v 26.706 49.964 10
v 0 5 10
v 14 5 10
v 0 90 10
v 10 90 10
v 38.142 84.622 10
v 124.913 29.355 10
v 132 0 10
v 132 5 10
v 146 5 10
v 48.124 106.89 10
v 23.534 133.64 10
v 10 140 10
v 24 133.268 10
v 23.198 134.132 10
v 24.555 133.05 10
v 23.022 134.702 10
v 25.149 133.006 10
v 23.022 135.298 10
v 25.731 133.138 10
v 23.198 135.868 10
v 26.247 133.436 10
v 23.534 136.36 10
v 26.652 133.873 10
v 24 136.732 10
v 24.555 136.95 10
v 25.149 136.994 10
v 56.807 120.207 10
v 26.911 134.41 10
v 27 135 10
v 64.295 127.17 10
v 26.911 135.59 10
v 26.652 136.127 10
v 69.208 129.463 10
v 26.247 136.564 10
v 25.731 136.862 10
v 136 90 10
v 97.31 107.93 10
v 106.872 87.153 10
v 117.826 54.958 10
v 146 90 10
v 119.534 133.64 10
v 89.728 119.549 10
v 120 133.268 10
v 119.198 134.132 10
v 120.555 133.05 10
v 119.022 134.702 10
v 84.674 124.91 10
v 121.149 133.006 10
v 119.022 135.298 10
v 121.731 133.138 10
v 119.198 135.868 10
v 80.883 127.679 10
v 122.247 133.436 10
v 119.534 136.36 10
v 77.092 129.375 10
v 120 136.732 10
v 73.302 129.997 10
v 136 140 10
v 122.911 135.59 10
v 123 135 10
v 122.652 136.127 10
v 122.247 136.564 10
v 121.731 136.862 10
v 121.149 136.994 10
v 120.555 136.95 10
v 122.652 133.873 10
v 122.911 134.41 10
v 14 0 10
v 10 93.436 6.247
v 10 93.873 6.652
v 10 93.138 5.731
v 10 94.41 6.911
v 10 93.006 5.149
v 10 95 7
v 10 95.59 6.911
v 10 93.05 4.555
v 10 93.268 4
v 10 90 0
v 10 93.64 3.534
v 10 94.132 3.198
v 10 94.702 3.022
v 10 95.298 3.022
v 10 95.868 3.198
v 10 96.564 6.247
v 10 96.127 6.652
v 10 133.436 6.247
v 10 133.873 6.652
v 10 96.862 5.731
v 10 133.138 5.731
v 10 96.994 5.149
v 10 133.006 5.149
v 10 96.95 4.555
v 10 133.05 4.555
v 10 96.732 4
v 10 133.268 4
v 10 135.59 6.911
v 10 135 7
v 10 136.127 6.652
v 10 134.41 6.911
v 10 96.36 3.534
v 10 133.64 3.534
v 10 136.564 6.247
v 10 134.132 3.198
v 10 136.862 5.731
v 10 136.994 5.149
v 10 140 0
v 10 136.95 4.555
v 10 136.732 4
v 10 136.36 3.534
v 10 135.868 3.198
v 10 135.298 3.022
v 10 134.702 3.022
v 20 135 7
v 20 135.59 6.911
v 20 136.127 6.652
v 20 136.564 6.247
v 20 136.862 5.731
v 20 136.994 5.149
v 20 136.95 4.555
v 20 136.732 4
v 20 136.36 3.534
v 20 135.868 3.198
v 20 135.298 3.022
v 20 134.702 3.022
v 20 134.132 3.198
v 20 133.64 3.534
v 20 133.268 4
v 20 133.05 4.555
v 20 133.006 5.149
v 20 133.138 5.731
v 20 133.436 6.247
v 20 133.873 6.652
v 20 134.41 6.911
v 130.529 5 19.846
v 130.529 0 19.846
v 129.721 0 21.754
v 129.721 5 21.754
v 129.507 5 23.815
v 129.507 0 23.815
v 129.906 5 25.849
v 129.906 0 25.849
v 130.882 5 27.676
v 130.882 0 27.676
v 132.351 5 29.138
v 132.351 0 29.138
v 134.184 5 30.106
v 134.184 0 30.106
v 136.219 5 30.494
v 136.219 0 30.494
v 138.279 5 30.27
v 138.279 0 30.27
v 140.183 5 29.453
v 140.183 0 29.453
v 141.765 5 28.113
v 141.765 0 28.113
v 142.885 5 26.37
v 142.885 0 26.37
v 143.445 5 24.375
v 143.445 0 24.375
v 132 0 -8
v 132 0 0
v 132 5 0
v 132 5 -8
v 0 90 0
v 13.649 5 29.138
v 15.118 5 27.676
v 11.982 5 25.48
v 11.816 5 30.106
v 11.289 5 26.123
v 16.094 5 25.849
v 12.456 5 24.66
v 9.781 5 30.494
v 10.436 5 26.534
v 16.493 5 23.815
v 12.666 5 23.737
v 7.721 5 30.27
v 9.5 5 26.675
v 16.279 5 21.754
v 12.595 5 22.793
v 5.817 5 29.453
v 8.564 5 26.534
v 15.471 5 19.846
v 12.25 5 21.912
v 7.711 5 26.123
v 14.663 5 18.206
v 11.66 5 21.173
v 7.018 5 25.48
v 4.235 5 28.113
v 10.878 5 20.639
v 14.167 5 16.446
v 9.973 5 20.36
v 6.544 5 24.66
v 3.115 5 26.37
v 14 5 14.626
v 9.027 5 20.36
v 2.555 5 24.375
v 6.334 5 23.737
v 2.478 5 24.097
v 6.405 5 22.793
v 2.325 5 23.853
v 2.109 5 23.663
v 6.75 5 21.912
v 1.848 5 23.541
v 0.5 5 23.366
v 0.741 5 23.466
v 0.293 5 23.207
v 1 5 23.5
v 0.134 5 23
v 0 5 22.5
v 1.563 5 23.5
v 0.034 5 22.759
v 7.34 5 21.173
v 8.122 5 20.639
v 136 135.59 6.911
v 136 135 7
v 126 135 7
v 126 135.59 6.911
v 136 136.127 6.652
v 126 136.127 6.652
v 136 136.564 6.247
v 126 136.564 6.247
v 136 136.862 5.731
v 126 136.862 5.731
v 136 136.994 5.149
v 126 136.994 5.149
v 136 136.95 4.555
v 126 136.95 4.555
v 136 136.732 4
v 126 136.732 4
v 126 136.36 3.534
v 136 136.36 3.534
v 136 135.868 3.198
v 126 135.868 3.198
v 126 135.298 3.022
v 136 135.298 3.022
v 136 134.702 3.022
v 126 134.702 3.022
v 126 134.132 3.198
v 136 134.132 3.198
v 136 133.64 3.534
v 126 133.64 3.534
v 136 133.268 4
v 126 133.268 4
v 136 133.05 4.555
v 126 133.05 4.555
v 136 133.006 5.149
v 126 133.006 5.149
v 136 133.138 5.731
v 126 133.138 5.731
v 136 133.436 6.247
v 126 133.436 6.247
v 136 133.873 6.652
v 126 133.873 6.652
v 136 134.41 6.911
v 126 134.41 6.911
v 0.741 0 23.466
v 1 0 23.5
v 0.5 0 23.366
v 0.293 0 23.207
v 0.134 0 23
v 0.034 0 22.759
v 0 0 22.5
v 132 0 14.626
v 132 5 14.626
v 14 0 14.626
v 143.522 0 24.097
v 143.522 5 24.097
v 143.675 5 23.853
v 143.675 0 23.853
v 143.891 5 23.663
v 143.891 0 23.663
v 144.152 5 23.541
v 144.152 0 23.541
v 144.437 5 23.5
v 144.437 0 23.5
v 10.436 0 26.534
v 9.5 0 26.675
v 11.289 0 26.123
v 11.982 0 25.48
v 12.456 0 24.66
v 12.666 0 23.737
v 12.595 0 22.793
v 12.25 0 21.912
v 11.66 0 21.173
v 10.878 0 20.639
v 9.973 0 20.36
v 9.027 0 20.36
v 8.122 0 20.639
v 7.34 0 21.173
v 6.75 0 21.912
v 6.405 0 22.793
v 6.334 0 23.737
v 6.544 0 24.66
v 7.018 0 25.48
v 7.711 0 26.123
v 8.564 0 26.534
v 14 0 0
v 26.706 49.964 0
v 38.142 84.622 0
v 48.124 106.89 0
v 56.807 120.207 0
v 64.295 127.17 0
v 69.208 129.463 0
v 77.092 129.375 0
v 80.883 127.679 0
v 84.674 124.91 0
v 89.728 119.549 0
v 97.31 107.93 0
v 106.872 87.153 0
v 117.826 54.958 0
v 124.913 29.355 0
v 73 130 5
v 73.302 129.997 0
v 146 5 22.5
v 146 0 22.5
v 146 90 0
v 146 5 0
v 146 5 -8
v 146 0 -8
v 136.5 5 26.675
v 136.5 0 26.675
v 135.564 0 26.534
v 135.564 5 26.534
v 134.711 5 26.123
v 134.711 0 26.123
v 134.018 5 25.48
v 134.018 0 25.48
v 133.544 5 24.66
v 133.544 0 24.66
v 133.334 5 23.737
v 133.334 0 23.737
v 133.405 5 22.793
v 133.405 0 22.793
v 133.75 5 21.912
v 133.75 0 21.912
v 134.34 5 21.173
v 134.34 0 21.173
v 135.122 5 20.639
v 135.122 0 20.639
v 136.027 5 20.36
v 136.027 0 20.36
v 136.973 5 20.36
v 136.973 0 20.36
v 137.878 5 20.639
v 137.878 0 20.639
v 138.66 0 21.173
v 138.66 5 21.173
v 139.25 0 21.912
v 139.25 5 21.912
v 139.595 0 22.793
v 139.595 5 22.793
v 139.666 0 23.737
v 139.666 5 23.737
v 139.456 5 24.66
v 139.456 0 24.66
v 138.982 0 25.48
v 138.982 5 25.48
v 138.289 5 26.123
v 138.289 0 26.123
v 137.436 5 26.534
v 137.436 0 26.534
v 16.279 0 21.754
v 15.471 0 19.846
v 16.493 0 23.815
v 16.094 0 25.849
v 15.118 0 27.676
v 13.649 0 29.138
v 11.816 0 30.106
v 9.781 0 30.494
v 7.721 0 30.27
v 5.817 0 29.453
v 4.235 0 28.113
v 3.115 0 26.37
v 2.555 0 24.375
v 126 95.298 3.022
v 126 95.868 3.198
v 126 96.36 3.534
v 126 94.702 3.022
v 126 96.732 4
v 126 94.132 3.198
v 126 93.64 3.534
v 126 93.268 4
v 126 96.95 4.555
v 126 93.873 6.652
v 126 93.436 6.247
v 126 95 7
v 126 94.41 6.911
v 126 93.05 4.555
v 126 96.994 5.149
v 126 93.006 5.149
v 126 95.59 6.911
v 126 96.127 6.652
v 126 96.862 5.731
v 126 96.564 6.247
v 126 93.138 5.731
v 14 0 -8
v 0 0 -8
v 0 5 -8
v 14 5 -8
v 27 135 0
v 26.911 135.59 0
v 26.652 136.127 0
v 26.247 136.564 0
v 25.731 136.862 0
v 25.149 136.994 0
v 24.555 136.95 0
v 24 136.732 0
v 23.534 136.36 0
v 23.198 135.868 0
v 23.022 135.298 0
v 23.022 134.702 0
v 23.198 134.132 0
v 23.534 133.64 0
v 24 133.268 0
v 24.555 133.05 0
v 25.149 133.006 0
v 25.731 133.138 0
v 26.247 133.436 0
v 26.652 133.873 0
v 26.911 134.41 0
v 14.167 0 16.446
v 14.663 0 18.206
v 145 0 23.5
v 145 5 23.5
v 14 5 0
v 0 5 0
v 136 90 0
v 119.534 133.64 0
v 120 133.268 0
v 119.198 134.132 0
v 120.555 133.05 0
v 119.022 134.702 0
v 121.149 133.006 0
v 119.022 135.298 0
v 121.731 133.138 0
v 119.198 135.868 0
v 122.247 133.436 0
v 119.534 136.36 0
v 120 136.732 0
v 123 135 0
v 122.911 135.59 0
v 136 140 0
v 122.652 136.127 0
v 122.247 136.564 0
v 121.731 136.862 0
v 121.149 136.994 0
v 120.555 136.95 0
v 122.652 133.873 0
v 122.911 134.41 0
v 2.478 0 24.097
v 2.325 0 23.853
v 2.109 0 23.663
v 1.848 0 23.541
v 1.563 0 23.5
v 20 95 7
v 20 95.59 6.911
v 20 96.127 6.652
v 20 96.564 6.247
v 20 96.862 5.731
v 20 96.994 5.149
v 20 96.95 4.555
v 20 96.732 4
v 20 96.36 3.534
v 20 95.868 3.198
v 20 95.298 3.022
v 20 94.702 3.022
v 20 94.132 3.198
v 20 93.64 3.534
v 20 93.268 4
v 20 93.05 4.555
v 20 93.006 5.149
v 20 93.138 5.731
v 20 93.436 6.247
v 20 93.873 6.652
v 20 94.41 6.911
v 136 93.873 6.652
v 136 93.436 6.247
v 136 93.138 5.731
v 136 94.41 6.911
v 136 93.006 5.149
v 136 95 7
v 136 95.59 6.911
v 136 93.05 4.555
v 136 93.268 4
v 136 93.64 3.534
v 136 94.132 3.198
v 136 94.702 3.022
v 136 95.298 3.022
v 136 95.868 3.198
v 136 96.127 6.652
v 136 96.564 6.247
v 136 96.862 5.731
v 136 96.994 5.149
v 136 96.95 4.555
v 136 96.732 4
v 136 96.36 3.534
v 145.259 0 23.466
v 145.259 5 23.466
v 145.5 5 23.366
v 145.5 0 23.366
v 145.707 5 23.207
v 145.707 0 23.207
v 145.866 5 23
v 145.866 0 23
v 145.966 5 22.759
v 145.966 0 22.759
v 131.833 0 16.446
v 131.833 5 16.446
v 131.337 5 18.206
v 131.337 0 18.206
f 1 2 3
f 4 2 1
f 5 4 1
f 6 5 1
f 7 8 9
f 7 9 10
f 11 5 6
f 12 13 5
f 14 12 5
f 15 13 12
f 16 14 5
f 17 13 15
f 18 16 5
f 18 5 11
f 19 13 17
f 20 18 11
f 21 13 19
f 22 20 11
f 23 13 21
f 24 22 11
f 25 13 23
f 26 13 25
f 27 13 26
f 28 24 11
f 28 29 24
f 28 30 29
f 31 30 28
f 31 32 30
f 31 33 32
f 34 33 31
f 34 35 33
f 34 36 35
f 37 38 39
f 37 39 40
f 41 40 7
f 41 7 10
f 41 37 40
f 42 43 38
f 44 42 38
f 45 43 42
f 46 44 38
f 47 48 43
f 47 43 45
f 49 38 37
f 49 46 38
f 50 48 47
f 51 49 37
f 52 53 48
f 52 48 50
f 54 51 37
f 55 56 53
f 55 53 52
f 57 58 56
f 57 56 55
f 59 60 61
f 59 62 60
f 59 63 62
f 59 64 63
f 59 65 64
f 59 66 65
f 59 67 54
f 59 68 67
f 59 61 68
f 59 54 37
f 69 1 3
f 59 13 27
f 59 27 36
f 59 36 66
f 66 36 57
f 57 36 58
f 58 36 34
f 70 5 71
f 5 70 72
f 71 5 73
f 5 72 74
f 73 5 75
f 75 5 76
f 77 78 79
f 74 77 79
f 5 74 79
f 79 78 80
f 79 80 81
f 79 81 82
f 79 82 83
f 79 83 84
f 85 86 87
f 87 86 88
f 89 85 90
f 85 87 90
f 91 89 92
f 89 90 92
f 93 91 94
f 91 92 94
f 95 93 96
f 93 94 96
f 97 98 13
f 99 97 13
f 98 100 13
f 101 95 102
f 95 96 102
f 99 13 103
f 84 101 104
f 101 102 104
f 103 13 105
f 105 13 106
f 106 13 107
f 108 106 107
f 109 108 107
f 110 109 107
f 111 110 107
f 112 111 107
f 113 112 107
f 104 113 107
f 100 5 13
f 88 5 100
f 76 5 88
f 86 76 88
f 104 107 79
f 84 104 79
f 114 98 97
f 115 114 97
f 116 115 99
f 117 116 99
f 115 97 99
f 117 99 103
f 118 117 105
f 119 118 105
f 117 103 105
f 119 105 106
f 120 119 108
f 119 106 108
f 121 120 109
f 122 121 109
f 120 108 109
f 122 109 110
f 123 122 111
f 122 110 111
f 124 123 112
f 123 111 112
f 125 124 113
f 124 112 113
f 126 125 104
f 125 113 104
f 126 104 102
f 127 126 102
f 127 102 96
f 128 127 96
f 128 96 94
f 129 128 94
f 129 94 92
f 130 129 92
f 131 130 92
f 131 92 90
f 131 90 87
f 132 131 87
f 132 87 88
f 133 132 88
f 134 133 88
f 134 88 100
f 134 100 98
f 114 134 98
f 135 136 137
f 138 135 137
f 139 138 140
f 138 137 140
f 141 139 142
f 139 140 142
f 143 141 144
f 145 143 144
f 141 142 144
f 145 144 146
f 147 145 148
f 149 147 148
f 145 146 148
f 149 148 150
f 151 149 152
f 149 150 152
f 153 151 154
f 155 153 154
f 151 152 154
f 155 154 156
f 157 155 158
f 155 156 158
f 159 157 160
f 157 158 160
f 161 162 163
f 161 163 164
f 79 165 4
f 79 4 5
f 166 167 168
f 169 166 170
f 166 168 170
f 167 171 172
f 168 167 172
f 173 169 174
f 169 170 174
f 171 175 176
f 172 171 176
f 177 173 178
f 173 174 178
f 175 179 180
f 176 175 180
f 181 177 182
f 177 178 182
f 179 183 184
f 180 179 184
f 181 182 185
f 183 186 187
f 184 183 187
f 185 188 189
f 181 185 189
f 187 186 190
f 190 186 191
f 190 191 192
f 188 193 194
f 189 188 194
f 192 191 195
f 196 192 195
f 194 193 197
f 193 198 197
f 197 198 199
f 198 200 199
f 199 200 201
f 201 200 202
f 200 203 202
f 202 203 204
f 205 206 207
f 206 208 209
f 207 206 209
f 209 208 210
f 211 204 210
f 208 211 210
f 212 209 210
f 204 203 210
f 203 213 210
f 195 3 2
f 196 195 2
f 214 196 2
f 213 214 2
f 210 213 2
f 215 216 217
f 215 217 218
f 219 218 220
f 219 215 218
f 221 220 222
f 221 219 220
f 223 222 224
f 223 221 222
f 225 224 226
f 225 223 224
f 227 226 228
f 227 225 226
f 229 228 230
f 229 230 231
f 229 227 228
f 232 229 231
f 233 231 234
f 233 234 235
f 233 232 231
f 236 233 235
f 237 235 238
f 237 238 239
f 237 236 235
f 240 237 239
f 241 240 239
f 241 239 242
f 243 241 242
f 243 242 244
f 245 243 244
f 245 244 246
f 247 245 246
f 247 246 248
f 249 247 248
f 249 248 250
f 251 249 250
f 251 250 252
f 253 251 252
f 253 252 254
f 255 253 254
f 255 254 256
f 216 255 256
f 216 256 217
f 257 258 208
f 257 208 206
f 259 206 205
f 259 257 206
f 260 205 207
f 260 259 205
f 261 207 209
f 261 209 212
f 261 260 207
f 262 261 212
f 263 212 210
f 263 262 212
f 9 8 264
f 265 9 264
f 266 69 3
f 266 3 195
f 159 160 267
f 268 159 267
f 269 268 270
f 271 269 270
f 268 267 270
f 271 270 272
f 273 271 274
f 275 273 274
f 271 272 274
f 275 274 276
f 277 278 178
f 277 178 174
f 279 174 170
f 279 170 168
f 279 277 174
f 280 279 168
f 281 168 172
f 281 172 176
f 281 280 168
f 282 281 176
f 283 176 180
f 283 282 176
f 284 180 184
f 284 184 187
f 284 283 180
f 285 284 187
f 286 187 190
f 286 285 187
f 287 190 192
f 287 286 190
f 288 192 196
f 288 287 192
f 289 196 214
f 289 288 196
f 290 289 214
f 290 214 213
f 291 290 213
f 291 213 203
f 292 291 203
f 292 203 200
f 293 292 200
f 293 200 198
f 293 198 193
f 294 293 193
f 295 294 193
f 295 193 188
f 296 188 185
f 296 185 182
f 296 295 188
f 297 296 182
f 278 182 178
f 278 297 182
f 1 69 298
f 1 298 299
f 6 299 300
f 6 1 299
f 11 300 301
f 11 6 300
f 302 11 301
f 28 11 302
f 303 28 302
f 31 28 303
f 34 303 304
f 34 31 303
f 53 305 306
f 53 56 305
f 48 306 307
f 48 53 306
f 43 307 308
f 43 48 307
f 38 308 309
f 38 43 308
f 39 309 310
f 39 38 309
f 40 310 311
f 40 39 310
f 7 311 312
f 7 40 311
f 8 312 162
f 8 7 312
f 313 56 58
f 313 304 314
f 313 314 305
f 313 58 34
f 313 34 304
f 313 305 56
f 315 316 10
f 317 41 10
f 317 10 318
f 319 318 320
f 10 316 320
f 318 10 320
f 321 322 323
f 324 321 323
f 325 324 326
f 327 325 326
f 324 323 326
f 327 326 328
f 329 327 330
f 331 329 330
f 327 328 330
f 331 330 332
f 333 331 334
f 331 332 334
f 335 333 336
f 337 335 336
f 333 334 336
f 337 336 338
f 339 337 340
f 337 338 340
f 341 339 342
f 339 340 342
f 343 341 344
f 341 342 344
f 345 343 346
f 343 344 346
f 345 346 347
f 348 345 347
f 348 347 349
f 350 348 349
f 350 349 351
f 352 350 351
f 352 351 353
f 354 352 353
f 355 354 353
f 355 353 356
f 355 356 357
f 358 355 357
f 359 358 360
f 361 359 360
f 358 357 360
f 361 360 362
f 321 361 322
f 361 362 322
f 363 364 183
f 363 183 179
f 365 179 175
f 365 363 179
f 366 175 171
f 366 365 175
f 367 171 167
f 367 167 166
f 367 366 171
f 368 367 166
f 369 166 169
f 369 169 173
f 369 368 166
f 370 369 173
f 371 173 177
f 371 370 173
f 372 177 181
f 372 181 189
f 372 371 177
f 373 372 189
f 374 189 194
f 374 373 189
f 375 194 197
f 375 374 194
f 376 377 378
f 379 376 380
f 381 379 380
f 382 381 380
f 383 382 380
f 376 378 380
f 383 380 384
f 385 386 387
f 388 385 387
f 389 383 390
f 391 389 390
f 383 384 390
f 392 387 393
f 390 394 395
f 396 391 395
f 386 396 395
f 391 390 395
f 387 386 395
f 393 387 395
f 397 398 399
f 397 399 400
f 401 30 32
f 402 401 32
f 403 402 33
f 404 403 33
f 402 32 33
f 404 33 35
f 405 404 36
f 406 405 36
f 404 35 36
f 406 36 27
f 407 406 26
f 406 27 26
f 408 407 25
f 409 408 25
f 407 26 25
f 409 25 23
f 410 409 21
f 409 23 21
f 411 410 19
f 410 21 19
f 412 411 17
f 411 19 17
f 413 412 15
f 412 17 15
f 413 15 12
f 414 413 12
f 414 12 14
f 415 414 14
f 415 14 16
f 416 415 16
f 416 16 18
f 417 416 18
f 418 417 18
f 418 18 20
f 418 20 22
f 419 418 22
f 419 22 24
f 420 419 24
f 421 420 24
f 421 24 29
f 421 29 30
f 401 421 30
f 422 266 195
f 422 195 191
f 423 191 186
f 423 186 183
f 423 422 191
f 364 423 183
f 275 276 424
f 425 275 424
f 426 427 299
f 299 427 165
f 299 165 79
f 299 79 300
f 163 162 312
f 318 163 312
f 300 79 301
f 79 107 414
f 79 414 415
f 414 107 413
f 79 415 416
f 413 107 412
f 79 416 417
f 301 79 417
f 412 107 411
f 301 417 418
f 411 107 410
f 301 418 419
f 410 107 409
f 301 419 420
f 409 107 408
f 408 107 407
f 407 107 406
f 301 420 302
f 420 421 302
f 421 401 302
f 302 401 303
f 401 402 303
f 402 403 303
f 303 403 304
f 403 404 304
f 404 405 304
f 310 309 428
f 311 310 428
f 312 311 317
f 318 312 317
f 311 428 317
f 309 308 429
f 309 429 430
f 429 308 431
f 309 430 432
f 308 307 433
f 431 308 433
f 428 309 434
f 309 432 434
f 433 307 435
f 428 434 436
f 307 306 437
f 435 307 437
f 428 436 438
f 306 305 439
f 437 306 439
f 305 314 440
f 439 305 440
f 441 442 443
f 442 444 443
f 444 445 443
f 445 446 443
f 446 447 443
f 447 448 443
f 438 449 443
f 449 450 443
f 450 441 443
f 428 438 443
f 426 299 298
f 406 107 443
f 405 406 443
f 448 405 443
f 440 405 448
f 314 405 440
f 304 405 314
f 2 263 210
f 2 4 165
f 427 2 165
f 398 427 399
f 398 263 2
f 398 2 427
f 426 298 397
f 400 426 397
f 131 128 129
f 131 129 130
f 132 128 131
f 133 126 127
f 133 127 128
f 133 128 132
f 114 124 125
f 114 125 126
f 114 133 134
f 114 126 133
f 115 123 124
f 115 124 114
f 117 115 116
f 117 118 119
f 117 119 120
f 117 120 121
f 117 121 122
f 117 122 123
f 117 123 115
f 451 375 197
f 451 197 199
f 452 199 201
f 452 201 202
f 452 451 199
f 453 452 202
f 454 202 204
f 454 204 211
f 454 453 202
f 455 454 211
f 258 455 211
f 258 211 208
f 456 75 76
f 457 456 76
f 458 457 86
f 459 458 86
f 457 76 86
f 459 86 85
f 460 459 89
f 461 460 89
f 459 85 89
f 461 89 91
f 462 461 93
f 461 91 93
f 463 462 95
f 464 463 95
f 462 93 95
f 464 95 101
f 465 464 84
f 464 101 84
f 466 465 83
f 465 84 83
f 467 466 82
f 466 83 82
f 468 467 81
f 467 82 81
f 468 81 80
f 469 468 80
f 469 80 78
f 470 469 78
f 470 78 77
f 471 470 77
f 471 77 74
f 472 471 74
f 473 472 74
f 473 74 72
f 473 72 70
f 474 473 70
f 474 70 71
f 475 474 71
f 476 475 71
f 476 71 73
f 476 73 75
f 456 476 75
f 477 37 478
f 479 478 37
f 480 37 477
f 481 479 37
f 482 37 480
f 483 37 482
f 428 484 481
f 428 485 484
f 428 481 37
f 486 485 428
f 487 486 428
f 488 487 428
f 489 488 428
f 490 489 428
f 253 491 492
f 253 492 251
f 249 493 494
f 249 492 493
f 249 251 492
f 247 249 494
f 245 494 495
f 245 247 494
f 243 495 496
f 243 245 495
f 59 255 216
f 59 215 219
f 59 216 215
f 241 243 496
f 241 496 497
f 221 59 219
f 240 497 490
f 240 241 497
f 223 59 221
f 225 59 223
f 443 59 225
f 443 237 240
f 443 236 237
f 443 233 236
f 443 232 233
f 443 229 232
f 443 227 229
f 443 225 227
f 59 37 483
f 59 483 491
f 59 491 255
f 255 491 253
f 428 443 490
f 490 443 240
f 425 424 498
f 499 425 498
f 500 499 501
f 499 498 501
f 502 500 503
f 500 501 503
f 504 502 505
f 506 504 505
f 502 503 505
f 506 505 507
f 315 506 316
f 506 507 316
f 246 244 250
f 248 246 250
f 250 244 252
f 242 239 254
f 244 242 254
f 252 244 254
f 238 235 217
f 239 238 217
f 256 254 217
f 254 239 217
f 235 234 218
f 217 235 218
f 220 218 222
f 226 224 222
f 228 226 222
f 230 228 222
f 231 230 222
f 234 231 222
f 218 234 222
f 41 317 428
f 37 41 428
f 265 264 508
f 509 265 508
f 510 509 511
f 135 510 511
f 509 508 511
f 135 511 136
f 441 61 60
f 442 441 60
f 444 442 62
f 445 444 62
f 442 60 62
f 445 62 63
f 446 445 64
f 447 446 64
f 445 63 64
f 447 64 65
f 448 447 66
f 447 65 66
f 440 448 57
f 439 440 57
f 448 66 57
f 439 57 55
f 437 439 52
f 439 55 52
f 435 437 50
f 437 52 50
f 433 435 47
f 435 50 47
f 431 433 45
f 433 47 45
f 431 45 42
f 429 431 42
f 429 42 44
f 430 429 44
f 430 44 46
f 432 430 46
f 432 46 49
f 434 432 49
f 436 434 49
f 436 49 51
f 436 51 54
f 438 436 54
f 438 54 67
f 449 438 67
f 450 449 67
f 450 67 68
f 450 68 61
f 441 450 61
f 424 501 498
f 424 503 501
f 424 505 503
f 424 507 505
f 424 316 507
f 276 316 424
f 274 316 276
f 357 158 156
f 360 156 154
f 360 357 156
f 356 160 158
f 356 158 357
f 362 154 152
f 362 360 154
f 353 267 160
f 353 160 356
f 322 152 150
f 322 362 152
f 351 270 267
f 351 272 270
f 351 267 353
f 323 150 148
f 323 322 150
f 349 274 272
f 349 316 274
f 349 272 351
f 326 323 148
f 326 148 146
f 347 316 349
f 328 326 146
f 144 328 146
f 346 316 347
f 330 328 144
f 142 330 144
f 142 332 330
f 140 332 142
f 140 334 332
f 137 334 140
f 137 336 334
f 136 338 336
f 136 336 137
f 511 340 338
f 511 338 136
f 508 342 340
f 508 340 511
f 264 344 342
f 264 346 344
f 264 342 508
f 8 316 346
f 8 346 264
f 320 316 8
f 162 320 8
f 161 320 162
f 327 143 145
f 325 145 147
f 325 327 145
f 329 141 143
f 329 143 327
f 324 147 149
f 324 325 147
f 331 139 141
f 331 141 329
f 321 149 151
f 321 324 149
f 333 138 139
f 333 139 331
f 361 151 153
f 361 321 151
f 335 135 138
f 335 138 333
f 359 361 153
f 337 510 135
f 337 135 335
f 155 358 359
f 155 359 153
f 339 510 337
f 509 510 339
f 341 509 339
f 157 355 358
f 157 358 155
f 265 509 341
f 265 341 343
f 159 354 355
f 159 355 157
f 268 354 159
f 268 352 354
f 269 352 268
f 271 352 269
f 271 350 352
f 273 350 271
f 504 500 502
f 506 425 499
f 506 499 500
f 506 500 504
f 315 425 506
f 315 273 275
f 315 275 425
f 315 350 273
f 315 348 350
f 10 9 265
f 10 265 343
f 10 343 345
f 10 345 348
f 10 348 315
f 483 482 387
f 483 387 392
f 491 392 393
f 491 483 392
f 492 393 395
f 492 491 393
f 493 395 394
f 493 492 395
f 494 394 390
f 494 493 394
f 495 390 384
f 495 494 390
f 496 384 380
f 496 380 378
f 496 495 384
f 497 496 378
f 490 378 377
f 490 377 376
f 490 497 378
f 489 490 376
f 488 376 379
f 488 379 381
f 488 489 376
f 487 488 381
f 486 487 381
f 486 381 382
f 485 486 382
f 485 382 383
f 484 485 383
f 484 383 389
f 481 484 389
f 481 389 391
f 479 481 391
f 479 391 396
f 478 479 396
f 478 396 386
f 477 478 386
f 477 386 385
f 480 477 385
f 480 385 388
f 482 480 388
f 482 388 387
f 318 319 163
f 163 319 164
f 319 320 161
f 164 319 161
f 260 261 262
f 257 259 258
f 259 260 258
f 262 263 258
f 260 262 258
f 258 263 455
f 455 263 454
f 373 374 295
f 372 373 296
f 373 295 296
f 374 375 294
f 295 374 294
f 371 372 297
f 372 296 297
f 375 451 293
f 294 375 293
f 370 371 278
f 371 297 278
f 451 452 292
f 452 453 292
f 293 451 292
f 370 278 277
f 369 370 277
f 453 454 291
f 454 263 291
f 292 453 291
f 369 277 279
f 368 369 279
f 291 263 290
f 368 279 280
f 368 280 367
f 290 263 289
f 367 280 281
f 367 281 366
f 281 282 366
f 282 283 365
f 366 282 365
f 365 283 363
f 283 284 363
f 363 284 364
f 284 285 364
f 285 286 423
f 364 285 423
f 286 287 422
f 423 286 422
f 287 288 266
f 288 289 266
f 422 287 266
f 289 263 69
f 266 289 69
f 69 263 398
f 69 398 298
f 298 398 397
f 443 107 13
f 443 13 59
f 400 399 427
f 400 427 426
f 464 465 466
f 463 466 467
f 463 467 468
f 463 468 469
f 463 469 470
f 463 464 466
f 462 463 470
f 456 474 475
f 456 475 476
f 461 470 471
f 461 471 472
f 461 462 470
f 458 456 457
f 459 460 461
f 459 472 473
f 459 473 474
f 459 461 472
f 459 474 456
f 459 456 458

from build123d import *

# Parameters (mm, degrees)
SKETCH1_W           = 146
SKETCH1_H           = 140
BOSS_EXTRUDE1_DEPTH = 10
CUT_EXTRUDE1_DEPTH  = 10
SKETCH9_R           = 2
CUT_EXTRUDE4_DEPTH  = 20
SKETCH10_W          = 10
SKETCH10_H          = 10
CUT_EXTRUDE5_DEPTH  = 50
SKETCH12_R          = 3.175
BOSS_EXTRUDE2_DEPTH = 5
SKETCH14_W          = 14
SKETCH14_H          = 8
BOSS_EXTRUDE3_DEPTH = 5
SKETCH15_R          = 2
CUT_EXTRUDE6_DEPTH  = 20


with BuildPart() as part:
    # Sketch1 → Boss-Extrude1 (new body)
    with BuildSketch(Plane.XY):
        with Locations((73, 70)):
            Rectangle(SKETCH1_W, SKETCH1_H)
    extrude(amount=BOSS_EXTRUDE1_DEPTH)

    # Sketch4 → Cut-Extrude1 (cut)
    with BuildSketch(Plane.XY.offset(10)):
        with BuildLine():
            Line((14, 0), (132, 0))
            add(Edge.make_bspline(
                [(14, 0), (73, 260), (132, 0)],
                knots=[0, 0, 0, 1, 1, 1], degree=2))
        make_face()
    extrude(amount=-CUT_EXTRUDE1_DEPTH, mode=Mode.SUBTRACT)

    # Sketch9 → Cut-Extrude4 (cut)
    with BuildSketch(Plane.ZY):
        with Locations((5, 135)):
            Circle(SKETCH9_R)
        with Locations((5, 95)):
            Circle(SKETCH9_R)
    cut_extrude4 = extrude(amount=-CUT_EXTRUDE4_DEPTH, mode=Mode.SUBTRACT)

    # Sketch10 → Cut-Extrude5 (cut)
    with BuildSketch(Plane(origin=(0, 140, 0), x_dir=(1, 0, 0), z_dir=(0, 1, 0))):
        with Locations((5, -5)):
            Rectangle(SKETCH10_W, SKETCH10_H)
    cut_extrude5 = extrude(amount=-CUT_EXTRUDE5_DEPTH, mode=Mode.SUBTRACT)

    # Mirror3: Cut-Extrude4, Cut-Extrude5 across plane
    add(cut_extrude4.mirror(Plane.ZY.offset(-73)), mode=Mode.SUBTRACT)
    add(cut_extrude5.mirror(Plane.ZY.offset(-73)), mode=Mode.SUBTRACT)

    # Sketch12 → Boss-Extrude2 (add)
    with BuildSketch(Plane(origin=(0, 0, 0), x_dir=(1, 0, 0), z_dir=(0, 1, 0))):
        with BuildLine():
            Line((14, -10), (14, -14.625880325))
            ThreePointArc((14, -14.625880325), (14.374665781, -17.337511048), (15.470588235, -19.845950722))
            ThreePointArc((15.470588235, -19.845950722), (11.81635247, -30.105642379), (2.554902808, -24.375))
            ThreePointArc((2.554902808, -24.375), (2.224183895, -23.75), (1.562746067, -23.5))
            Line((1.562746067, -23.5), (1, -23.5))
            ThreePointArc((1, -23.5), (0.292893219, -23.207106781), (0, -22.5))
            Line((0, -22.5), (0, -10))
            Line((0, -10), (14, -10))
        make_face()
        with Locations(Location((9.5, -23.5, 0), (0, 0, 270))):
            Circle(SKETCH12_R, mode=Mode.SUBTRACT)
    boss_extrude2 = extrude(amount=BOSS_EXTRUDE2_DEPTH)

    # Mirror4: Boss-Extrude2 across plane
    add(boss_extrude2.mirror(Plane.ZY.offset(-73)))

    # Sketch14 → Boss-Extrude3 (add)
    with BuildSketch(Plane(origin=(0, 0, 0), x_dir=(1, 0, 0), z_dir=(0, 1, 0))):
        with Locations((7, 4)):
            Rectangle(SKETCH14_W, SKETCH14_H)
    boss_extrude3 = extrude(amount=BOSS_EXTRUDE3_DEPTH)

    # Mirror5: Boss-Extrude3 across plane
    add(boss_extrude3.mirror(Plane.ZY.offset(-73)))

    # Sketch15 → Cut-Extrude6 (cut)
    with BuildSketch(Plane.XY.offset(10)):
        with Locations((25, 135)):
            Circle(SKETCH15_R)
        with Locations((121, 135)):
            Circle(SKETCH15_R)
    extrude(amount=-CUT_EXTRUDE6_DEPTH, mode=Mode.SUBTRACT)


solid = part.part
